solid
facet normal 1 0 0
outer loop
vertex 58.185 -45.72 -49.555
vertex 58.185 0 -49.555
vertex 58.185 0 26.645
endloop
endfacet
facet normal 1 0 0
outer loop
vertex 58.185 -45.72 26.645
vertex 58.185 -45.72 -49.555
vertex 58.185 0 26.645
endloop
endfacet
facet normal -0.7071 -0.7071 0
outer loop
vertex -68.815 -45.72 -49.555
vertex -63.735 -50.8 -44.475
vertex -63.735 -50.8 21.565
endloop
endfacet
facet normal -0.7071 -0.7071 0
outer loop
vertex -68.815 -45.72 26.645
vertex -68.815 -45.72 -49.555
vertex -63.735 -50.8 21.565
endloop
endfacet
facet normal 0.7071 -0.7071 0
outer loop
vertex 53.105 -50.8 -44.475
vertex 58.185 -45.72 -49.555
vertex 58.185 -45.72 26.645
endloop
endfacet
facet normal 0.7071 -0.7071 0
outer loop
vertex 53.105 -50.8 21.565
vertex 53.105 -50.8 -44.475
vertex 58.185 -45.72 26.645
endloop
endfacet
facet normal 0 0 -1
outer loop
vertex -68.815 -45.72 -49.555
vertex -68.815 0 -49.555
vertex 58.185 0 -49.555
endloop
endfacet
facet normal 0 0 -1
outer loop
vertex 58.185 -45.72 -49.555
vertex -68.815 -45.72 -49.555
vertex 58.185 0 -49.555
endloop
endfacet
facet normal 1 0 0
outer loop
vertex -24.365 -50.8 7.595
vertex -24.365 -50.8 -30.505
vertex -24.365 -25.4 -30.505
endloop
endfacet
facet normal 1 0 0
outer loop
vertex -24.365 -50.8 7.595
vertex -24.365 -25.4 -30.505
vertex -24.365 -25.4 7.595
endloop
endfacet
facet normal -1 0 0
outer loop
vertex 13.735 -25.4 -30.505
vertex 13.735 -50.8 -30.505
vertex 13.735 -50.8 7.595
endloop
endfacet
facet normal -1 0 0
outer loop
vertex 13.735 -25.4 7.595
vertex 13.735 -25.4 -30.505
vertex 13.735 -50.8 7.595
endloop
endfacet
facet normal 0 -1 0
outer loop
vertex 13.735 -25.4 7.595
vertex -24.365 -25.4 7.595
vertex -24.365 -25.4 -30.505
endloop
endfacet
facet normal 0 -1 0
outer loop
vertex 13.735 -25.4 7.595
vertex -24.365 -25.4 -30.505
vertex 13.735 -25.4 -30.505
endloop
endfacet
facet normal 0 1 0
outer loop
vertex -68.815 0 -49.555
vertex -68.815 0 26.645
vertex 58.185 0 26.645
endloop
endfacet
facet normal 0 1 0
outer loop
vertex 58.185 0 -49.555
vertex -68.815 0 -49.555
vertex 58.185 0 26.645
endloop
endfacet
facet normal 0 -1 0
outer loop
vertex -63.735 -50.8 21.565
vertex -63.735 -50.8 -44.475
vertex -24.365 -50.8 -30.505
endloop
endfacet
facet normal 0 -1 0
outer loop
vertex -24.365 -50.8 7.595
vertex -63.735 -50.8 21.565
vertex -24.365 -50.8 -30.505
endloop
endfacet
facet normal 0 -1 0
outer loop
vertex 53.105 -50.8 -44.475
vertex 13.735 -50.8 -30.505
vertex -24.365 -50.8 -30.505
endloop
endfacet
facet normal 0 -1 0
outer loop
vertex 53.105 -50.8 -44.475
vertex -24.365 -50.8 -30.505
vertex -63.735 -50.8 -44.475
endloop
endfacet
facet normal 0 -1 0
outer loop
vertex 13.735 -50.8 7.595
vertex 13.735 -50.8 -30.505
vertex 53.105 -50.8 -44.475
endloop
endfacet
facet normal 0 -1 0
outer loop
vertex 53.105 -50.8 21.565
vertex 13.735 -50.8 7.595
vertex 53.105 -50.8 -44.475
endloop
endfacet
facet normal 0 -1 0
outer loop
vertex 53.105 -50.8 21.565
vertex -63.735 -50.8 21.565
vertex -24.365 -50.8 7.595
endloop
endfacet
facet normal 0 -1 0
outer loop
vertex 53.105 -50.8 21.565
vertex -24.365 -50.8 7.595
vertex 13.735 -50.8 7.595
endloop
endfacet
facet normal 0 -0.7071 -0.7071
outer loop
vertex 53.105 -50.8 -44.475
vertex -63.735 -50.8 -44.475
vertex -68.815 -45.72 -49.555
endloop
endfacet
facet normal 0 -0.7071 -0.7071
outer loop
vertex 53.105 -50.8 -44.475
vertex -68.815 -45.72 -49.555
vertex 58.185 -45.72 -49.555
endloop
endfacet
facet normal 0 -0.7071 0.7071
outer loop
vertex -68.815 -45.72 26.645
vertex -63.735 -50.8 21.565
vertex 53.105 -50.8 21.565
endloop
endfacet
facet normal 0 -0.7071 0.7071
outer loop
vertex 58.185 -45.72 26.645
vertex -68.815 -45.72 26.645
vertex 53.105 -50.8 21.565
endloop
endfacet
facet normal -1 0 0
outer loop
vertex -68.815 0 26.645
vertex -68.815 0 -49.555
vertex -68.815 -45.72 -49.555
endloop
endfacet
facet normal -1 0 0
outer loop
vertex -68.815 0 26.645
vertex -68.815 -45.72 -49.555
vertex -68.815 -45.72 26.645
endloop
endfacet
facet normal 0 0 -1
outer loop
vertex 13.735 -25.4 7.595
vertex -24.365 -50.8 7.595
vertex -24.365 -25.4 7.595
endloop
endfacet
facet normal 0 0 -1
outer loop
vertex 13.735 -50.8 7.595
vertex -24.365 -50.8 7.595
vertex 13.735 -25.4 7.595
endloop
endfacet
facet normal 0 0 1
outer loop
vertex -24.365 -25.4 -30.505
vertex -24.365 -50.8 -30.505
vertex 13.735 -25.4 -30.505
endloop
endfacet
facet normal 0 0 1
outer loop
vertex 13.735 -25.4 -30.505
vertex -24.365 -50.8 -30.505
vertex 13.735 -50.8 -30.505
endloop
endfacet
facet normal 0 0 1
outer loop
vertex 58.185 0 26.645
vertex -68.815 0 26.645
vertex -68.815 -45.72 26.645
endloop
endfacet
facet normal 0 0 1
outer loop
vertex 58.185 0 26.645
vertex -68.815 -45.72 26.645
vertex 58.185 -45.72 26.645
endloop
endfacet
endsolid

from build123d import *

# Parameters (mm, degrees)
F0_W     = 127
F0_H     = 76.2
F1_DEPTH = 50.8
F2_W     = 38.1
F2_H     = 38.1
F3_DEPTH = 25.4
F4_SIZE  = 5.08


with BuildPart() as f1:
    # F0 (on Front) → F1 (new body)
    with BuildSketch(Plane.XZ):
        with Locations((-5.314695, -11.454906)):
            Rectangle(F0_W, F0_H)
    extrude(amount=F1_DEPTH)

    # F2 (on face) → F3 (cut)
    with BuildSketch(Plane.XZ.offset(50.8)):
        with Locations((-5.314695, -11.454906)):
            Rectangle(F2_W, F2_H)
    extrude(amount=-F3_DEPTH, mode=Mode.SUBTRACT)

    # F4
    f4_edges = [f1.edges().sort_by_distance(p)[0] for p in [
        (-5.314695, -50.8, 26.645094),
        (58.185305, -50.8, -11.454906),
        (-5.314695, -50.8, -49.554906),
        (-68.814695, -50.8, -11.454906),
    ]]
    chamfer(f4_edges, length=F4_SIZE)


solid = f1.part
